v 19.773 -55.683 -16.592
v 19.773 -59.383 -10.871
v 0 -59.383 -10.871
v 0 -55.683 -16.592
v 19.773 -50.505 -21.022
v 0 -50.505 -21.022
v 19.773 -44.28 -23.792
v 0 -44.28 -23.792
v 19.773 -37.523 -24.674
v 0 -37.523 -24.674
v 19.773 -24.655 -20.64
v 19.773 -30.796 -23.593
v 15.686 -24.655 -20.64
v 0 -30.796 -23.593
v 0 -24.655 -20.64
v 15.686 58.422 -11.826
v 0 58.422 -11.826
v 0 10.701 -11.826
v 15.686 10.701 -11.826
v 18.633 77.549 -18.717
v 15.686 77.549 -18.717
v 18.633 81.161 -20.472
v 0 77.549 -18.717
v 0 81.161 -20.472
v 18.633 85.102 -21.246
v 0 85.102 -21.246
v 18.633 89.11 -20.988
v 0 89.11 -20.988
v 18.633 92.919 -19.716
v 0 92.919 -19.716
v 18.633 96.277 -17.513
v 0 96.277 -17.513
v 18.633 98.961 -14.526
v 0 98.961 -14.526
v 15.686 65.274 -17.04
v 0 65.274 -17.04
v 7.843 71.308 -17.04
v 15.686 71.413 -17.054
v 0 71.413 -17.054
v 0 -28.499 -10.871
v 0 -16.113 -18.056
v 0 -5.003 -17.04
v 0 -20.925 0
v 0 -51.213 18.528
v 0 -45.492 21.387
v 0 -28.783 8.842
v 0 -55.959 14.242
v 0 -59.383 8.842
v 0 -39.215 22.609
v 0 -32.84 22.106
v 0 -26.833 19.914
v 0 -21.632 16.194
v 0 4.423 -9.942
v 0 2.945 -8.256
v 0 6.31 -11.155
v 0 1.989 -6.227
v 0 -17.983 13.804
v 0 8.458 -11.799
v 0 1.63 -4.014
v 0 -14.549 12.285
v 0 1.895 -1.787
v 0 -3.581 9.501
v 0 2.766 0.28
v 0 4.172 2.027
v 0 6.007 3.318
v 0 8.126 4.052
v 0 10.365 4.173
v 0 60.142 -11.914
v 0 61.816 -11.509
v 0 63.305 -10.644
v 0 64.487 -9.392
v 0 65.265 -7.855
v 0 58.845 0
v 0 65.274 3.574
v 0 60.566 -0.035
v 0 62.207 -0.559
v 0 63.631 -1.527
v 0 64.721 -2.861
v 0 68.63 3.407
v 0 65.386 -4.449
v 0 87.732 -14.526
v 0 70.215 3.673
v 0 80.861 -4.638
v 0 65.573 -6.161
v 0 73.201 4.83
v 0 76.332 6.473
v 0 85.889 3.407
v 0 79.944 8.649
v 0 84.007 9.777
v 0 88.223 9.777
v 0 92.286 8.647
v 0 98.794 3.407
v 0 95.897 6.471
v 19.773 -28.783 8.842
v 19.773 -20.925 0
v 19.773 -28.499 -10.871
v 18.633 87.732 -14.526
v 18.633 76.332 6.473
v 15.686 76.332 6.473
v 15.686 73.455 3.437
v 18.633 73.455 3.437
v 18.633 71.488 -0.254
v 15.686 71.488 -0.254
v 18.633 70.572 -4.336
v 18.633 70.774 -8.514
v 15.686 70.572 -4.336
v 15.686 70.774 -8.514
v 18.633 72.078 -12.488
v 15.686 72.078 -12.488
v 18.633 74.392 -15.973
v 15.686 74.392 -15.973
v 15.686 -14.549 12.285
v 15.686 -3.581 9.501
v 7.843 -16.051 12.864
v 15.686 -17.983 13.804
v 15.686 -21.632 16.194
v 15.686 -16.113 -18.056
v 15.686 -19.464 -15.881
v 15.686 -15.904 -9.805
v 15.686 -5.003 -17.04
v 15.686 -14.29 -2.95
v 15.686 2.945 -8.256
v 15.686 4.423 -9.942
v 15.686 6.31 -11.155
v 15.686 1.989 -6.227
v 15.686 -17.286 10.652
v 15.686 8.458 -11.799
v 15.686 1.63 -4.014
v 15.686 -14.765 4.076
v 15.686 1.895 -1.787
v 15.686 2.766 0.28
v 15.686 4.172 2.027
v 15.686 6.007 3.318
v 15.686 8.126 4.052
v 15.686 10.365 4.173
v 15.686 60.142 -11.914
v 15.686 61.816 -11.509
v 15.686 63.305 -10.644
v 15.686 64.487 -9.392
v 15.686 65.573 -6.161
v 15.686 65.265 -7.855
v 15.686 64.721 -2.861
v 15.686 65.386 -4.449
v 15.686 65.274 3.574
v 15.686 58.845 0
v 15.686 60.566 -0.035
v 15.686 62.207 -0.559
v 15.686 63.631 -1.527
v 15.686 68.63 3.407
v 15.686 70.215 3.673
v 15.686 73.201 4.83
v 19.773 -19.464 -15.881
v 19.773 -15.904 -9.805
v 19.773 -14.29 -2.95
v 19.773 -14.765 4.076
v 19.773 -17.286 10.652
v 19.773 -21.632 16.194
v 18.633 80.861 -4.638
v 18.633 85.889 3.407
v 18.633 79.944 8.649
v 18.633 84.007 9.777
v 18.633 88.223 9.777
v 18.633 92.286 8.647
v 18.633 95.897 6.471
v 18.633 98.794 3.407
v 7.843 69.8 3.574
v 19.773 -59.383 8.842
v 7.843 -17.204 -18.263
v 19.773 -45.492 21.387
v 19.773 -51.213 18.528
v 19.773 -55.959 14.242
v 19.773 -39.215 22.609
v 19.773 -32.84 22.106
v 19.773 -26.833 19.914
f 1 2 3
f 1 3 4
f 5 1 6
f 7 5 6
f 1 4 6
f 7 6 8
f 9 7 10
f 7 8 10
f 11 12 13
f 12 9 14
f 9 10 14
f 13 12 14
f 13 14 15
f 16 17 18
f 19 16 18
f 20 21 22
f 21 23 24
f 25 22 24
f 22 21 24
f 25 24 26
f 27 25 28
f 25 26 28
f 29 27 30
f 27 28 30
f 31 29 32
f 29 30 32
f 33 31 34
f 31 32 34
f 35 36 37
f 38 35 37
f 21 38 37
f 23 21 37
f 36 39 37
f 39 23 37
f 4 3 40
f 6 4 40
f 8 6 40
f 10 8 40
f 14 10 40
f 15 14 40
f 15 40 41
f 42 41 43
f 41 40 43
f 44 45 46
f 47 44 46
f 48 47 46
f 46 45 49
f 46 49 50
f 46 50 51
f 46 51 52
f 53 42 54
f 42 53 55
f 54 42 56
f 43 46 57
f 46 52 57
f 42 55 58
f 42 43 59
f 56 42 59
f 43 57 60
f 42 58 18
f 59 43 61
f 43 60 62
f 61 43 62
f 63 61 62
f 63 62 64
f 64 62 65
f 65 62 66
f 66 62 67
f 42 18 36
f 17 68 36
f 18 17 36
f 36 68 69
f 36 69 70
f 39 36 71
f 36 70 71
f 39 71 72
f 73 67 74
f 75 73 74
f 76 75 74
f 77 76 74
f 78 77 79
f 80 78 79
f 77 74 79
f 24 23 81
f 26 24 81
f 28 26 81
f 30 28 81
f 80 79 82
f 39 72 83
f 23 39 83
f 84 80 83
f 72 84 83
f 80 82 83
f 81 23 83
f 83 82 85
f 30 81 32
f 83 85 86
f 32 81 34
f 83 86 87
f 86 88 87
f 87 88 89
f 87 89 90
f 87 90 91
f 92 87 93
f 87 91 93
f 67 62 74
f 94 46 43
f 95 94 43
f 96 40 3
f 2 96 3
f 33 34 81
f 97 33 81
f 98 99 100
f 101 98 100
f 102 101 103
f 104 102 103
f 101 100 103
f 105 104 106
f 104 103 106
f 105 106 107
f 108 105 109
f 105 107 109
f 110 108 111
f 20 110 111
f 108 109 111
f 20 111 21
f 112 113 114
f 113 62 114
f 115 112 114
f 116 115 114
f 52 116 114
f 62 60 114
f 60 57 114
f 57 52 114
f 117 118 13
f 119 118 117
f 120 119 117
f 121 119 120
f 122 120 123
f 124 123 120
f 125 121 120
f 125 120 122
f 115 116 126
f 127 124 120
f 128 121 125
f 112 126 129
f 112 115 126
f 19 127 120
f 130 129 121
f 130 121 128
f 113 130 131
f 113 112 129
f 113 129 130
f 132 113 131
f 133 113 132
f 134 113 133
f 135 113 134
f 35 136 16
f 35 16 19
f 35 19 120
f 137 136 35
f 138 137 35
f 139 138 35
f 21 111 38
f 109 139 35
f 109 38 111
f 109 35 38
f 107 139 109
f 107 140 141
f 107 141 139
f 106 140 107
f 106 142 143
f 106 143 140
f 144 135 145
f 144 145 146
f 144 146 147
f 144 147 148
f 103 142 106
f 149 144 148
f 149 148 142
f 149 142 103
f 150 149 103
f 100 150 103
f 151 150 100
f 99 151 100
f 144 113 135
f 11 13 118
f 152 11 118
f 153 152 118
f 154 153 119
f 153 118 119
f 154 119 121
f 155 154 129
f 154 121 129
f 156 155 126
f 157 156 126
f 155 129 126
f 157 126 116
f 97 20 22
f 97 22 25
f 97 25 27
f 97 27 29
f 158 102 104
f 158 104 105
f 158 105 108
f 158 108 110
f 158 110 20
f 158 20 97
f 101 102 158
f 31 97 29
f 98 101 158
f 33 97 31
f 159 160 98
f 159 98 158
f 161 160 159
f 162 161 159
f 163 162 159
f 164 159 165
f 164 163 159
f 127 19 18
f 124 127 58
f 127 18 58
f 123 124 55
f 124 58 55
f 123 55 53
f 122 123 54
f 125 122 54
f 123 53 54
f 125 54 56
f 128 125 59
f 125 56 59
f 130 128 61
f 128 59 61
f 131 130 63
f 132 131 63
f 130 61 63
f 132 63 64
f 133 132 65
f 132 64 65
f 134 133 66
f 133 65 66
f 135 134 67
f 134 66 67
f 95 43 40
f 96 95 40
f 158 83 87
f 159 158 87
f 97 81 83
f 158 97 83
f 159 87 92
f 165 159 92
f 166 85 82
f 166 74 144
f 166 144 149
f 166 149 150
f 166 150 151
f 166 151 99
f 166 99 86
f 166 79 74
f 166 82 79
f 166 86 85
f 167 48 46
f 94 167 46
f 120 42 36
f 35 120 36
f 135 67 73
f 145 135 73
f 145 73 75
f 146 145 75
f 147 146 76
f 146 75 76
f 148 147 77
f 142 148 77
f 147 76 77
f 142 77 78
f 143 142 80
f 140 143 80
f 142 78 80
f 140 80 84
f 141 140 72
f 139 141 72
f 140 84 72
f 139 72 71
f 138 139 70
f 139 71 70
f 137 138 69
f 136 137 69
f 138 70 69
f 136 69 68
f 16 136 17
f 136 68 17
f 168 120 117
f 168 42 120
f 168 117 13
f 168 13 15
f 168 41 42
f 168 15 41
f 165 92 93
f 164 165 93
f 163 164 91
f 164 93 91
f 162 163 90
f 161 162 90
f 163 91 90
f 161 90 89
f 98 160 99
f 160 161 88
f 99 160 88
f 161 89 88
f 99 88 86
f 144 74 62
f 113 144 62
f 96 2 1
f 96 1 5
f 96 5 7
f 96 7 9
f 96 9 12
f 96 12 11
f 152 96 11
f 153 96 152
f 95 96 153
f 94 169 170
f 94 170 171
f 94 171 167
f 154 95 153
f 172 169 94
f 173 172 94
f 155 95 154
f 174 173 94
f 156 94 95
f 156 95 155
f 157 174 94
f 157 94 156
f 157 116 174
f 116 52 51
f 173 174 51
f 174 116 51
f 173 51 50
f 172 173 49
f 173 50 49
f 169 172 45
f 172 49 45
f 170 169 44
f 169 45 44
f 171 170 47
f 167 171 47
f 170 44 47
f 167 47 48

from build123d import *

# Parameters (mm, degrees)
F1_DEPTH = 19.77278
F2_DEPTH = 15.68583
F3_DEPTH = 18.63252


with BuildPart() as f1:
    # F0 (on Right) → F1 (new body)
    with BuildSketch(Plane.YZ):
        with BuildLine():
            ThreePointArc((-24.6550113916, -20.6403282086), (-14.2899358418, -2.9499328055), (-21.631764082, 16.1937982509))
            ThreePointArc((-21.631764082, 16.1937982509), (-42.3952279546, 22.2110941878), (-59.3834631145, 8.8421320543))
            Line((-59.3834631145, 8.8421320543), (-28.7830121815, 8.8421320543))
            Line((-28.7830121815, 8.8421320543), (-20.9254194051, 0))
            Line((-20.9254194051, 0), (-28.4993667156, -10.8708310872))
            Line((-28.4993667156, -10.8708310872), (-59.3834631145, -10.8708310872))
            ThreePointArc((-59.3834631145, -10.8708310872), (-44.2799639395, -23.7919746243), (-24.6550113916, -20.6403282086))
        make_face()
    extrude(amount=F1_DEPTH)

    # F0 (on Right) → F2 (join)
    with BuildSketch(Plane.YZ):
        with BuildLine():
            ThreePointArc((77.5488621059, -18.7172400394), (70.5319981338, -6.4315126272), (76.3324780773, 6.4731342287))
            add(Edge.make_bspline(
                [(65.274477005, 3.5741054453), (66.7329266753, 3.4044171276), (70.0264053954, 3.0170299241), (74.0730411994, 5.2423594483), (76.3324780773, 6.4731342287)],
                knots=[0, 0, 0, 0, 0.4431105797, 1, 1, 1, 1], degree=3))
            Line((65.274477005, 3.5741054453), (-3.5807129461, 9.5008024946))
            add(Edge.make_bspline(
                [(-3.5807129461, 9.5008024946), (-8.1850167721, 10.4946023635), (-16.0626627691, 12.1809603216), (-19.9918558673, 15.0252283967), (-21.631764082, 16.1937982509)],
                knots=[0, 0, 0, 0, 0.5850187294, 1, 1, 1, 1], degree=3))
            ThreePointArc((-21.631764082, 16.1937982509), (-14.2899358418, -2.9499328055), (-24.6550113916, -20.6403282086))
            add(Edge.make_bspline(
                [(-5.0028073601, -17.0401390642), (-9.3359102028, -17.2862450952), (-17.1312640888, -17.7232079089), (-22.3392021757, -19.7477540646), (-24.6550113916, -20.6403282086)],
                knots=[0, 0, 0, 0, 0.5559843151, 1, 1, 1, 1], degree=3))
            Line((-5.0028073601, -17.0401390642), (65.274477005, -17.0401390642))
            add(Edge.make_bspline(
                [(65.274477005, -17.0401390642), (67.2859868291, -16.906336394), (71.3774576279, -16.6405736864), (75.4718135628, -18.0105027903), (77.5488621059, -18.7172400394)],
                knots=[0, 0, 0, 0, 0.4914160588, 1, 1, 1, 1], degree=3))
        make_face()
        with BuildLine():
            ThreePointArc((58.8446073234, 0), (65.572685649, -6.1609610629), (58.4222972393, -11.8263317272))
            Line((58.4222972393, -11.8263317272), (10.7007976621, -11.8263317272))
            ThreePointArc((10.7007976621, -11.8263317272), (1.6295820492, -4.0135137585), (10.365163526, 4.1728586721))
            Line((10.365163526, 4.1728586721), (58.8446073234, 0))
        make_face(mode=Mode.SUBTRACT)
    extrude(amount=F2_DEPTH)

    # F0 (on Right) → F3 (join)
    with BuildSketch(Plane.YZ):
        with BuildLine():
            Line((85.8887135983, 3.4065102227), (98.7935736775, 3.4065102227))
            ThreePointArc((98.7935736775, 3.4065102227), (88.2234276148, 9.7768503479), (76.3324780773, 6.4731342287))
            ThreePointArc((76.3324780773, 6.4731342287), (70.5319981338, -6.4315126272), (77.5488621059, -18.7172400394))
            ThreePointArc((77.5488621059, -18.7172400394), (89.1096263343, -20.9880157606), (98.9611595869, -14.5262060687))
            Line((98.9611595869, -14.5262060687), (87.73227036, -14.5262060687))
            Line((87.73227036, -14.5262060687), (80.8608531952, -4.6380725689))
            Line((80.8608531952, -4.6380725689), (85.8887135983, 3.4065102227))
        make_face()
    extrude(amount=F3_DEPTH)


solid = f1.part
